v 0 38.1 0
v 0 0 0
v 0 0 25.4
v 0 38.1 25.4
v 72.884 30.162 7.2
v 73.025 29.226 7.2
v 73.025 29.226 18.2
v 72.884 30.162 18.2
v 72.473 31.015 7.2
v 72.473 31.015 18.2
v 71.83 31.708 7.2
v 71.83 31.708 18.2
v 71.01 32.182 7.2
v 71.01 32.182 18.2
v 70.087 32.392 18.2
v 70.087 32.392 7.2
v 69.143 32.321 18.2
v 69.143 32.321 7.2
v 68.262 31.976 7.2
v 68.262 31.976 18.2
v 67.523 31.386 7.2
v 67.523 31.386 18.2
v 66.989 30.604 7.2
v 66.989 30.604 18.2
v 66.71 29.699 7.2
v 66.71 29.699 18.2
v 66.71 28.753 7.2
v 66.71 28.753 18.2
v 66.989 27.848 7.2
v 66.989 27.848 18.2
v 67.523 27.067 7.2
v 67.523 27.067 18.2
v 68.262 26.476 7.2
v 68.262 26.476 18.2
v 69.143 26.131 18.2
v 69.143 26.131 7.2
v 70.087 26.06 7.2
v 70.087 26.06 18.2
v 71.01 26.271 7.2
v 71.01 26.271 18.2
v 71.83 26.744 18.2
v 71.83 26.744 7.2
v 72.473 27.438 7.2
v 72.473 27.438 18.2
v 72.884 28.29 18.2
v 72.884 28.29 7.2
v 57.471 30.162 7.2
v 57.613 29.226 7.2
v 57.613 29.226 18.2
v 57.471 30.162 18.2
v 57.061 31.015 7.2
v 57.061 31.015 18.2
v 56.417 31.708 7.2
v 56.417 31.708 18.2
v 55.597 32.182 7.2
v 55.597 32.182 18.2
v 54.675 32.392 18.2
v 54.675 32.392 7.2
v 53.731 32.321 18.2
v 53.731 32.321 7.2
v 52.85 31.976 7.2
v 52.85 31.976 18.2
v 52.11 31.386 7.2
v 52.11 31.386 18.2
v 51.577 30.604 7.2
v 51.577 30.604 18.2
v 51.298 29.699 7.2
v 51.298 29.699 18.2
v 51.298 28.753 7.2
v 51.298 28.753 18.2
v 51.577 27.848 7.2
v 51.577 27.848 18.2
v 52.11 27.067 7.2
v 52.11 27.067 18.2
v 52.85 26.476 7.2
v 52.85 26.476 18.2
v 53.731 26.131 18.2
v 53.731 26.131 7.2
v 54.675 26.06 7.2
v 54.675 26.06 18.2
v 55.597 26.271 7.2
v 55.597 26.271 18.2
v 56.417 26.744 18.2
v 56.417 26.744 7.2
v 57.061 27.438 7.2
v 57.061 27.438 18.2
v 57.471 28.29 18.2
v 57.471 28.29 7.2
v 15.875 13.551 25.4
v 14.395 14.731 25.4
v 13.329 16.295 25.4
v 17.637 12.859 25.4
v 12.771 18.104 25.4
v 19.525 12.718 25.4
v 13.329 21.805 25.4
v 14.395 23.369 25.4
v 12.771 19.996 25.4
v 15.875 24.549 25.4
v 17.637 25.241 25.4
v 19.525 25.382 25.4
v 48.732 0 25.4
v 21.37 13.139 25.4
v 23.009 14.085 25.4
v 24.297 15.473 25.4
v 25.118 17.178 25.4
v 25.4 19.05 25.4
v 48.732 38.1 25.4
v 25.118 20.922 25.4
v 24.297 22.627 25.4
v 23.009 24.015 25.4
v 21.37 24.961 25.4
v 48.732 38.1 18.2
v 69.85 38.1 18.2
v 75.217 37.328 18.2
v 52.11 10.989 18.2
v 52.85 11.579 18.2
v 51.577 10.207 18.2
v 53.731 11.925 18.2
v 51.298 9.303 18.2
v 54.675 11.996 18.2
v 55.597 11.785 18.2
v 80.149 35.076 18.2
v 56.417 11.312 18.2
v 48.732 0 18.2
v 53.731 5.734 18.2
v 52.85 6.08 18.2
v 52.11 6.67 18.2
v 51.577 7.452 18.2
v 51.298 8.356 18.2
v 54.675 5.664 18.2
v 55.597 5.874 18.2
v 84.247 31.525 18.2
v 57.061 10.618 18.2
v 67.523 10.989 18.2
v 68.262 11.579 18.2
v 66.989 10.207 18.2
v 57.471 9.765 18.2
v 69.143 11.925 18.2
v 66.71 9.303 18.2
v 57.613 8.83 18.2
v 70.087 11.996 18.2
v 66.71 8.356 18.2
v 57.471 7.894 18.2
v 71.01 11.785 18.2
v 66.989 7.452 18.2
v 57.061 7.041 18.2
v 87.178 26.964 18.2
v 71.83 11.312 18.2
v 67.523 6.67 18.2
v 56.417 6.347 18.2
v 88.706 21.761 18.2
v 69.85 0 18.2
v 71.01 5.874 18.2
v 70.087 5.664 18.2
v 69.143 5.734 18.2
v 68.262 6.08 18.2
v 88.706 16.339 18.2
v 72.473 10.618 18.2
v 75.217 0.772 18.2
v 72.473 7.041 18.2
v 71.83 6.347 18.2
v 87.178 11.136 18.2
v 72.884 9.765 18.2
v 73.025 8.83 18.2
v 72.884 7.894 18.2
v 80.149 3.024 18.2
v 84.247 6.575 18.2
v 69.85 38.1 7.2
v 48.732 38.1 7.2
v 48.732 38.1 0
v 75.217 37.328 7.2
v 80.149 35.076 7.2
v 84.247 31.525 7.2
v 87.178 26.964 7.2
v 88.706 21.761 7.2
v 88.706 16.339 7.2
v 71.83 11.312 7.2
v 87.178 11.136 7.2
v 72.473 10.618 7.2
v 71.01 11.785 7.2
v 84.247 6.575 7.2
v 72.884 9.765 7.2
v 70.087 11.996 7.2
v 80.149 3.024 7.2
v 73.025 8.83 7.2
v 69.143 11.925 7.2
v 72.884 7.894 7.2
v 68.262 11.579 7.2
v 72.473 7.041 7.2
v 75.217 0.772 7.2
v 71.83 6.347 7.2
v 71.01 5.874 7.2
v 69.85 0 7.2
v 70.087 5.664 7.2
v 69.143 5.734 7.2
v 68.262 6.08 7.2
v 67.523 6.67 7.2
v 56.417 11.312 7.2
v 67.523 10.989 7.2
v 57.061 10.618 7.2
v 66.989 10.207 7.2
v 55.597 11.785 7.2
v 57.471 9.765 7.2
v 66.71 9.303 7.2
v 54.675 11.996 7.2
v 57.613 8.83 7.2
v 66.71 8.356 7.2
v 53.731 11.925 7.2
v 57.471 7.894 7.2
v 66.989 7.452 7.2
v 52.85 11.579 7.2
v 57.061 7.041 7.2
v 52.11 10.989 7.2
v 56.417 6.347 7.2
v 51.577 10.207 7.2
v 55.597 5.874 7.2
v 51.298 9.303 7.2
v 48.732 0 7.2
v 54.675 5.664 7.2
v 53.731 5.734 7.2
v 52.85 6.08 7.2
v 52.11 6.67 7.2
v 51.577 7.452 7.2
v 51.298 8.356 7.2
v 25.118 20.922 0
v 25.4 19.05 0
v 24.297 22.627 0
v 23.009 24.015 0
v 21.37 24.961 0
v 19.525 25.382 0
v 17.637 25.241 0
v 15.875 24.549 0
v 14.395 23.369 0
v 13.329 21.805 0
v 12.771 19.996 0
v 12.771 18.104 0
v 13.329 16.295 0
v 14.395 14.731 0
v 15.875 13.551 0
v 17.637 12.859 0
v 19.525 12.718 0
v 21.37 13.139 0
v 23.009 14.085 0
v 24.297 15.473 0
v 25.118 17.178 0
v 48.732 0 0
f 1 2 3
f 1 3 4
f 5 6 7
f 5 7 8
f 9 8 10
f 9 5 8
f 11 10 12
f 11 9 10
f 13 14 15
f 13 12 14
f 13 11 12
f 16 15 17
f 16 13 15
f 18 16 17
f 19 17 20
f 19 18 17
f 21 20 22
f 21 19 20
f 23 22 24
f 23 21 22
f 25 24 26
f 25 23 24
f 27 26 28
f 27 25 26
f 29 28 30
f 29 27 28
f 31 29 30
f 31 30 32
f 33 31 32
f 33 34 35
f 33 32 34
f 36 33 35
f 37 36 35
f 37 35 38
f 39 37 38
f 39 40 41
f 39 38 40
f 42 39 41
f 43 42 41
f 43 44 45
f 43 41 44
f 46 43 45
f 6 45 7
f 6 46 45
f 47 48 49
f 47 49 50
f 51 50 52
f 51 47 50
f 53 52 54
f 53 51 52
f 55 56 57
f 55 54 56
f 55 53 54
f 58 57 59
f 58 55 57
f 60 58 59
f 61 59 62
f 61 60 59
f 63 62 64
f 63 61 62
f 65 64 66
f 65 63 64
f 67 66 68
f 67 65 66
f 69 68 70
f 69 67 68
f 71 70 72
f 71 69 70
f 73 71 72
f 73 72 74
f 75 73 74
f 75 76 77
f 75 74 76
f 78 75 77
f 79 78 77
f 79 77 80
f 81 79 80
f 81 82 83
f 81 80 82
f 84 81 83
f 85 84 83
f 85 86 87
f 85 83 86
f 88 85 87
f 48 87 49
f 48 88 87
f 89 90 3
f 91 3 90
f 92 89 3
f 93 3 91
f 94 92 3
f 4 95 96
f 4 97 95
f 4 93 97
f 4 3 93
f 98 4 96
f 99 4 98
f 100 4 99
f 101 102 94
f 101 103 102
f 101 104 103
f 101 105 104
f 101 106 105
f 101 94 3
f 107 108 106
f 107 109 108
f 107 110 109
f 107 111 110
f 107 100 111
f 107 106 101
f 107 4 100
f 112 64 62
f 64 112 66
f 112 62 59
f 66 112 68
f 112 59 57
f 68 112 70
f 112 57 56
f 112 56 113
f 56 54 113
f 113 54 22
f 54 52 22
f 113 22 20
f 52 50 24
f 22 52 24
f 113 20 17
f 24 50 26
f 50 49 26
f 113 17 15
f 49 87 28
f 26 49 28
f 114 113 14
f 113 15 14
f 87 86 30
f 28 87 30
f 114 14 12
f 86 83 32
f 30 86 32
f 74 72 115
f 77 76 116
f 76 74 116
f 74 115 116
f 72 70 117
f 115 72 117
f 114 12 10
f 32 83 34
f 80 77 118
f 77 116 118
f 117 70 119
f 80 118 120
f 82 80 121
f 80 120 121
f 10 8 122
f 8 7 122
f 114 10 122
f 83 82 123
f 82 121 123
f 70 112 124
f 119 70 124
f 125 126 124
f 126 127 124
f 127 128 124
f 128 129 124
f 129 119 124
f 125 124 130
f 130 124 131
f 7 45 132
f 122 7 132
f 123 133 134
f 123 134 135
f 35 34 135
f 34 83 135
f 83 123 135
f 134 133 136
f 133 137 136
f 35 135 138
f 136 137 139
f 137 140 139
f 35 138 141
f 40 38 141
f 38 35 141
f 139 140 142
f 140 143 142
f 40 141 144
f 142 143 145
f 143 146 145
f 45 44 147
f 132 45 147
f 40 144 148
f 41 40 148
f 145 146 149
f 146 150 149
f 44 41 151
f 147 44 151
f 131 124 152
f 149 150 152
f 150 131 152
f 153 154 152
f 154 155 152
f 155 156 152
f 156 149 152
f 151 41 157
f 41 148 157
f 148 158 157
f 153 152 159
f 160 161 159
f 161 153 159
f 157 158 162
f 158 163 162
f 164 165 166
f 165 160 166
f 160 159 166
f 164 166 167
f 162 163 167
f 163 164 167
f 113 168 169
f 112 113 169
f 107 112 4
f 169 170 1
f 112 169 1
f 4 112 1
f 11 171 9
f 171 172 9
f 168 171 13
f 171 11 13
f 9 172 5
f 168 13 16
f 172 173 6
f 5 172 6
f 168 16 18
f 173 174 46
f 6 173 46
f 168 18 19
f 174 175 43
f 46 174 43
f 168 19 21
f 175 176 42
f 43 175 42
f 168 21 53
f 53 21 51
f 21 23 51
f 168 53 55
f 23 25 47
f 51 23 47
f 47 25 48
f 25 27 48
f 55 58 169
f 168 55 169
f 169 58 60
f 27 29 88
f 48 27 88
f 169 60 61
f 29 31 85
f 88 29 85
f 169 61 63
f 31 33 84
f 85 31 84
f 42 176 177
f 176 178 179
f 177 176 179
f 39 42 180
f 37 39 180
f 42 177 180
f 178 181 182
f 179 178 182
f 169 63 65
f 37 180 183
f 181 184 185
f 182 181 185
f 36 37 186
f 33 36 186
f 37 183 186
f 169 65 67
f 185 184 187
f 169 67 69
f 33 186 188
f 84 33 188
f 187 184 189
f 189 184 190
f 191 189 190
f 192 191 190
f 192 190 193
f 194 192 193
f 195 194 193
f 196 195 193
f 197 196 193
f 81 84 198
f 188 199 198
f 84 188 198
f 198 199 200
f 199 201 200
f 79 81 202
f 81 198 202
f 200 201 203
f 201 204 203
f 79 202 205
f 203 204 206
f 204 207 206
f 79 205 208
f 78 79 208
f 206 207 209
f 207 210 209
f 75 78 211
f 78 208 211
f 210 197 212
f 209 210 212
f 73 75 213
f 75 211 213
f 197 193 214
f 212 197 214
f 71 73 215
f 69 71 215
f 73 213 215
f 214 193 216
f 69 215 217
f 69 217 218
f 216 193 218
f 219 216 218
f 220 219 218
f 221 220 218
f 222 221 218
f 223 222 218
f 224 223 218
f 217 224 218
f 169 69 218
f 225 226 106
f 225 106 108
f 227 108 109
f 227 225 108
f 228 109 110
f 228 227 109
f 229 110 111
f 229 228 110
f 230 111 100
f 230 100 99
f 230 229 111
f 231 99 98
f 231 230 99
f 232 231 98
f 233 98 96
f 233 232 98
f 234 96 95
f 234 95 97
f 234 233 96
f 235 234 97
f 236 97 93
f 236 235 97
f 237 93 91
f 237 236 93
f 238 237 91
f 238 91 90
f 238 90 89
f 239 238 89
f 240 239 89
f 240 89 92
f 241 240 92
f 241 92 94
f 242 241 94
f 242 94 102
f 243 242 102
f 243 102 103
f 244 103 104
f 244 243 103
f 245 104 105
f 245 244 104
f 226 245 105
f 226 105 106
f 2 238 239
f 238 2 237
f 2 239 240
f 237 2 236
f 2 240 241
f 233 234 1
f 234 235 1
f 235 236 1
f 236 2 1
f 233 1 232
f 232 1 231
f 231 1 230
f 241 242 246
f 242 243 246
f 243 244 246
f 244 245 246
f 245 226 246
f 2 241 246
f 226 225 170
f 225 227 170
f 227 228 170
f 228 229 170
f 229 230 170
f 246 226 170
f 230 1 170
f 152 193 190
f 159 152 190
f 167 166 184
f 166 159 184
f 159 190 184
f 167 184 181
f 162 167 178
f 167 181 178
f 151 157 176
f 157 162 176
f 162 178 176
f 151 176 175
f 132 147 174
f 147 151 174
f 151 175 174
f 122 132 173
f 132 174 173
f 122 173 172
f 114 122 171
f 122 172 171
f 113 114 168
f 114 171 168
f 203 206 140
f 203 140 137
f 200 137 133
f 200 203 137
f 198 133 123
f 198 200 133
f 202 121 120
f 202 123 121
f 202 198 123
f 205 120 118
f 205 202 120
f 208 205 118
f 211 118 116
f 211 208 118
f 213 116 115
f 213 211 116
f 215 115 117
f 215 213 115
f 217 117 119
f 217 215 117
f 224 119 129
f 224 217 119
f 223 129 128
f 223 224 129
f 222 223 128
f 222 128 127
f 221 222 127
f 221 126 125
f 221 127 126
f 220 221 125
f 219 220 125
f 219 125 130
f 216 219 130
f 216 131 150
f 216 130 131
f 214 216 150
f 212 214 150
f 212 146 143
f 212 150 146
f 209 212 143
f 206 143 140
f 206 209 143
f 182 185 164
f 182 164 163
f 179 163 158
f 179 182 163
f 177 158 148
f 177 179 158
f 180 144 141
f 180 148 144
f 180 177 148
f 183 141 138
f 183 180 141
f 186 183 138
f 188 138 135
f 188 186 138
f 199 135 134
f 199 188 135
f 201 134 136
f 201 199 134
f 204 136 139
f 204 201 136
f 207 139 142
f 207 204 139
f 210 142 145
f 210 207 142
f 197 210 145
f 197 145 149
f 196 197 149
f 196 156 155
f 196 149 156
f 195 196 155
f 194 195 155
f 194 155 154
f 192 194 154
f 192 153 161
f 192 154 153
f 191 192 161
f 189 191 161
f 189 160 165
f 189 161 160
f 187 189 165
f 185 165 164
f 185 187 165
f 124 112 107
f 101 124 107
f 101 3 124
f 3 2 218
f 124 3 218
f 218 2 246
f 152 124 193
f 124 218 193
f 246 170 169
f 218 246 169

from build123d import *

# Parameters (mm, degrees)
F0_W     = 38.1
F0_H     = 38.1
F0_R     = 6.35
F0_R_2   = 3.175
F1_DEPTH = 25.4
F2_W     = 21.117794
F2_H     = 7.199542
F2_W_2   = 19.090971
F3_DEPTH = 38.101


with BuildPart() as f1:
    # F0 (on Top) → F1 (new body)
    with BuildSketch(Plane.XY):
        with Locations((19.05, 19.05)):
            Rectangle(F0_W, F0_H)
        with Locations((19.05, 19.05)):
            Circle(F0_R, mode=Mode.SUBTRACT)
        with BuildLine():
            Line((69.85, 38.1), (38.1, 38.1))
            Line((38.1, 38.1), (38.1, 0))
            Line((38.1, 0), (69.85, 0))
            ThreePointArc((69.85, 0), (88.9, 19.05), (69.85, 38.1))
        make_face()
        with Locations((54.437503, 8.829627)):
            Circle(F0_R_2, mode=Mode.SUBTRACT)
        with Locations((69.85, 8.829627)):
            Circle(F0_R_2, mode=Mode.SUBTRACT)
        with Locations((54.437503, 29.22605)):
            Circle(F0_R_2, mode=Mode.SUBTRACT)
        with Locations((69.85, 29.22605)):
            Circle(F0_R_2, mode=Mode.SUBTRACT)
    extrude(amount=F1_DEPTH)

    # F2 (on face) → F3 (cut, through all)
    with BuildSketch(Plane.XZ):
        with Locations((59.291103, 21.800229)):
            Rectangle(F2_W, F2_H)
        with Locations((79.395485, 21.800229)):
            Rectangle(F2_W_2, F2_H)
        with Locations((59.291103, 3.599771)):
            Rectangle(F2_W, F2_H)
        with Locations((79.395485, 3.599771)):
            Rectangle(F2_W_2, F2_H)
    extrude(amount=-F3_DEPTH, mode=Mode.SUBTRACT)


solid = f1.part
